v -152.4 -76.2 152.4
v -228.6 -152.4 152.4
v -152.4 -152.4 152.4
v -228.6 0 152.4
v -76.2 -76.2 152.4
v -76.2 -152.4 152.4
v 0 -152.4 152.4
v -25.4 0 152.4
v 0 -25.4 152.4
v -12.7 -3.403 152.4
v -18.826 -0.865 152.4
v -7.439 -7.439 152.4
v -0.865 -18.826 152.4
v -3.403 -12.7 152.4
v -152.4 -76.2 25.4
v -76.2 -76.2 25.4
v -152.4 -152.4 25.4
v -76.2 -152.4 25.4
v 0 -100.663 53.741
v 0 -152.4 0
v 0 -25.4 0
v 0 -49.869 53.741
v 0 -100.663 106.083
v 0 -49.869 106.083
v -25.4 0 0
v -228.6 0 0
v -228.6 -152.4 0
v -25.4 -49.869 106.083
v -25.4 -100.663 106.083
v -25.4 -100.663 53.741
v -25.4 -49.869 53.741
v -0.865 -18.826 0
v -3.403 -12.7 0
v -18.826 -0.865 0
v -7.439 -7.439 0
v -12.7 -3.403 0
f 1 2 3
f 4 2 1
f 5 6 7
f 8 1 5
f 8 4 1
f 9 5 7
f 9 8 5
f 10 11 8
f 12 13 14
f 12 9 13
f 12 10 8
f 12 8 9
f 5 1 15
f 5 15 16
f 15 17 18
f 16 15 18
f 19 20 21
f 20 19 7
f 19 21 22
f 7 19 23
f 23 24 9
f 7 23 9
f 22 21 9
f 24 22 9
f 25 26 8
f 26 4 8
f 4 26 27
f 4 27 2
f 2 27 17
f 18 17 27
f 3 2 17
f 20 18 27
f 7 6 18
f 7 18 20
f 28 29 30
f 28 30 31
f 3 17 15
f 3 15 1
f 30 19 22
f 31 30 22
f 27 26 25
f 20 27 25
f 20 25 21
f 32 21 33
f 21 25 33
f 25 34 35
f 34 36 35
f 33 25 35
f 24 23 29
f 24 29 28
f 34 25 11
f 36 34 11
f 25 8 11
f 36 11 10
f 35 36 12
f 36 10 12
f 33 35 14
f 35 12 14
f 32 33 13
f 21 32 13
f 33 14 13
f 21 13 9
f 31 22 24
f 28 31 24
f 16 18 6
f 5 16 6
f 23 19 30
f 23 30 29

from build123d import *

# Parameters (mm, degrees)
F0_W     = 228.6
F0_H     = 152.4
F1_DEPTH = 152.4
F2_W     = 76.2
F2_H     = 127
F3_DEPTH = 76.2
F4_W     = 50.793443
F4_H     = 52.342028
F5_DEPTH = 25.4
F6_R     = 25.4


with BuildPart() as f1:
    # F0 (on Front) → F1 (new body)
    with BuildSketch(Plane.XZ):
        with Locations((-114.3, 76.2)):
            Rectangle(F0_W, F0_H)
    extrude(amount=F1_DEPTH)

    # F2 (on face) → F3 (cut)
    with BuildSketch(Plane.XZ.offset(152.4)):
        with Locations((-114.3, 88.9)):
            Rectangle(F2_W, F2_H)
    extrude(amount=-F3_DEPTH, mode=Mode.SUBTRACT)

    # F4 (on face) → F5 (cut)
    with BuildSketch(Plane.YZ):
        with Locations((-75.265935, 79.911679)):
            Rectangle(F4_W, F4_H)
    extrude(amount=-F5_DEPTH, mode=Mode.SUBTRACT)

    # F6
    f6_edges = [f1.edges().sort_by_distance(p)[0] for p in [
        (0, 0, 76.2),
    ]]
    fillet(f6_edges, radius=F6_R)


solid = f1.part
